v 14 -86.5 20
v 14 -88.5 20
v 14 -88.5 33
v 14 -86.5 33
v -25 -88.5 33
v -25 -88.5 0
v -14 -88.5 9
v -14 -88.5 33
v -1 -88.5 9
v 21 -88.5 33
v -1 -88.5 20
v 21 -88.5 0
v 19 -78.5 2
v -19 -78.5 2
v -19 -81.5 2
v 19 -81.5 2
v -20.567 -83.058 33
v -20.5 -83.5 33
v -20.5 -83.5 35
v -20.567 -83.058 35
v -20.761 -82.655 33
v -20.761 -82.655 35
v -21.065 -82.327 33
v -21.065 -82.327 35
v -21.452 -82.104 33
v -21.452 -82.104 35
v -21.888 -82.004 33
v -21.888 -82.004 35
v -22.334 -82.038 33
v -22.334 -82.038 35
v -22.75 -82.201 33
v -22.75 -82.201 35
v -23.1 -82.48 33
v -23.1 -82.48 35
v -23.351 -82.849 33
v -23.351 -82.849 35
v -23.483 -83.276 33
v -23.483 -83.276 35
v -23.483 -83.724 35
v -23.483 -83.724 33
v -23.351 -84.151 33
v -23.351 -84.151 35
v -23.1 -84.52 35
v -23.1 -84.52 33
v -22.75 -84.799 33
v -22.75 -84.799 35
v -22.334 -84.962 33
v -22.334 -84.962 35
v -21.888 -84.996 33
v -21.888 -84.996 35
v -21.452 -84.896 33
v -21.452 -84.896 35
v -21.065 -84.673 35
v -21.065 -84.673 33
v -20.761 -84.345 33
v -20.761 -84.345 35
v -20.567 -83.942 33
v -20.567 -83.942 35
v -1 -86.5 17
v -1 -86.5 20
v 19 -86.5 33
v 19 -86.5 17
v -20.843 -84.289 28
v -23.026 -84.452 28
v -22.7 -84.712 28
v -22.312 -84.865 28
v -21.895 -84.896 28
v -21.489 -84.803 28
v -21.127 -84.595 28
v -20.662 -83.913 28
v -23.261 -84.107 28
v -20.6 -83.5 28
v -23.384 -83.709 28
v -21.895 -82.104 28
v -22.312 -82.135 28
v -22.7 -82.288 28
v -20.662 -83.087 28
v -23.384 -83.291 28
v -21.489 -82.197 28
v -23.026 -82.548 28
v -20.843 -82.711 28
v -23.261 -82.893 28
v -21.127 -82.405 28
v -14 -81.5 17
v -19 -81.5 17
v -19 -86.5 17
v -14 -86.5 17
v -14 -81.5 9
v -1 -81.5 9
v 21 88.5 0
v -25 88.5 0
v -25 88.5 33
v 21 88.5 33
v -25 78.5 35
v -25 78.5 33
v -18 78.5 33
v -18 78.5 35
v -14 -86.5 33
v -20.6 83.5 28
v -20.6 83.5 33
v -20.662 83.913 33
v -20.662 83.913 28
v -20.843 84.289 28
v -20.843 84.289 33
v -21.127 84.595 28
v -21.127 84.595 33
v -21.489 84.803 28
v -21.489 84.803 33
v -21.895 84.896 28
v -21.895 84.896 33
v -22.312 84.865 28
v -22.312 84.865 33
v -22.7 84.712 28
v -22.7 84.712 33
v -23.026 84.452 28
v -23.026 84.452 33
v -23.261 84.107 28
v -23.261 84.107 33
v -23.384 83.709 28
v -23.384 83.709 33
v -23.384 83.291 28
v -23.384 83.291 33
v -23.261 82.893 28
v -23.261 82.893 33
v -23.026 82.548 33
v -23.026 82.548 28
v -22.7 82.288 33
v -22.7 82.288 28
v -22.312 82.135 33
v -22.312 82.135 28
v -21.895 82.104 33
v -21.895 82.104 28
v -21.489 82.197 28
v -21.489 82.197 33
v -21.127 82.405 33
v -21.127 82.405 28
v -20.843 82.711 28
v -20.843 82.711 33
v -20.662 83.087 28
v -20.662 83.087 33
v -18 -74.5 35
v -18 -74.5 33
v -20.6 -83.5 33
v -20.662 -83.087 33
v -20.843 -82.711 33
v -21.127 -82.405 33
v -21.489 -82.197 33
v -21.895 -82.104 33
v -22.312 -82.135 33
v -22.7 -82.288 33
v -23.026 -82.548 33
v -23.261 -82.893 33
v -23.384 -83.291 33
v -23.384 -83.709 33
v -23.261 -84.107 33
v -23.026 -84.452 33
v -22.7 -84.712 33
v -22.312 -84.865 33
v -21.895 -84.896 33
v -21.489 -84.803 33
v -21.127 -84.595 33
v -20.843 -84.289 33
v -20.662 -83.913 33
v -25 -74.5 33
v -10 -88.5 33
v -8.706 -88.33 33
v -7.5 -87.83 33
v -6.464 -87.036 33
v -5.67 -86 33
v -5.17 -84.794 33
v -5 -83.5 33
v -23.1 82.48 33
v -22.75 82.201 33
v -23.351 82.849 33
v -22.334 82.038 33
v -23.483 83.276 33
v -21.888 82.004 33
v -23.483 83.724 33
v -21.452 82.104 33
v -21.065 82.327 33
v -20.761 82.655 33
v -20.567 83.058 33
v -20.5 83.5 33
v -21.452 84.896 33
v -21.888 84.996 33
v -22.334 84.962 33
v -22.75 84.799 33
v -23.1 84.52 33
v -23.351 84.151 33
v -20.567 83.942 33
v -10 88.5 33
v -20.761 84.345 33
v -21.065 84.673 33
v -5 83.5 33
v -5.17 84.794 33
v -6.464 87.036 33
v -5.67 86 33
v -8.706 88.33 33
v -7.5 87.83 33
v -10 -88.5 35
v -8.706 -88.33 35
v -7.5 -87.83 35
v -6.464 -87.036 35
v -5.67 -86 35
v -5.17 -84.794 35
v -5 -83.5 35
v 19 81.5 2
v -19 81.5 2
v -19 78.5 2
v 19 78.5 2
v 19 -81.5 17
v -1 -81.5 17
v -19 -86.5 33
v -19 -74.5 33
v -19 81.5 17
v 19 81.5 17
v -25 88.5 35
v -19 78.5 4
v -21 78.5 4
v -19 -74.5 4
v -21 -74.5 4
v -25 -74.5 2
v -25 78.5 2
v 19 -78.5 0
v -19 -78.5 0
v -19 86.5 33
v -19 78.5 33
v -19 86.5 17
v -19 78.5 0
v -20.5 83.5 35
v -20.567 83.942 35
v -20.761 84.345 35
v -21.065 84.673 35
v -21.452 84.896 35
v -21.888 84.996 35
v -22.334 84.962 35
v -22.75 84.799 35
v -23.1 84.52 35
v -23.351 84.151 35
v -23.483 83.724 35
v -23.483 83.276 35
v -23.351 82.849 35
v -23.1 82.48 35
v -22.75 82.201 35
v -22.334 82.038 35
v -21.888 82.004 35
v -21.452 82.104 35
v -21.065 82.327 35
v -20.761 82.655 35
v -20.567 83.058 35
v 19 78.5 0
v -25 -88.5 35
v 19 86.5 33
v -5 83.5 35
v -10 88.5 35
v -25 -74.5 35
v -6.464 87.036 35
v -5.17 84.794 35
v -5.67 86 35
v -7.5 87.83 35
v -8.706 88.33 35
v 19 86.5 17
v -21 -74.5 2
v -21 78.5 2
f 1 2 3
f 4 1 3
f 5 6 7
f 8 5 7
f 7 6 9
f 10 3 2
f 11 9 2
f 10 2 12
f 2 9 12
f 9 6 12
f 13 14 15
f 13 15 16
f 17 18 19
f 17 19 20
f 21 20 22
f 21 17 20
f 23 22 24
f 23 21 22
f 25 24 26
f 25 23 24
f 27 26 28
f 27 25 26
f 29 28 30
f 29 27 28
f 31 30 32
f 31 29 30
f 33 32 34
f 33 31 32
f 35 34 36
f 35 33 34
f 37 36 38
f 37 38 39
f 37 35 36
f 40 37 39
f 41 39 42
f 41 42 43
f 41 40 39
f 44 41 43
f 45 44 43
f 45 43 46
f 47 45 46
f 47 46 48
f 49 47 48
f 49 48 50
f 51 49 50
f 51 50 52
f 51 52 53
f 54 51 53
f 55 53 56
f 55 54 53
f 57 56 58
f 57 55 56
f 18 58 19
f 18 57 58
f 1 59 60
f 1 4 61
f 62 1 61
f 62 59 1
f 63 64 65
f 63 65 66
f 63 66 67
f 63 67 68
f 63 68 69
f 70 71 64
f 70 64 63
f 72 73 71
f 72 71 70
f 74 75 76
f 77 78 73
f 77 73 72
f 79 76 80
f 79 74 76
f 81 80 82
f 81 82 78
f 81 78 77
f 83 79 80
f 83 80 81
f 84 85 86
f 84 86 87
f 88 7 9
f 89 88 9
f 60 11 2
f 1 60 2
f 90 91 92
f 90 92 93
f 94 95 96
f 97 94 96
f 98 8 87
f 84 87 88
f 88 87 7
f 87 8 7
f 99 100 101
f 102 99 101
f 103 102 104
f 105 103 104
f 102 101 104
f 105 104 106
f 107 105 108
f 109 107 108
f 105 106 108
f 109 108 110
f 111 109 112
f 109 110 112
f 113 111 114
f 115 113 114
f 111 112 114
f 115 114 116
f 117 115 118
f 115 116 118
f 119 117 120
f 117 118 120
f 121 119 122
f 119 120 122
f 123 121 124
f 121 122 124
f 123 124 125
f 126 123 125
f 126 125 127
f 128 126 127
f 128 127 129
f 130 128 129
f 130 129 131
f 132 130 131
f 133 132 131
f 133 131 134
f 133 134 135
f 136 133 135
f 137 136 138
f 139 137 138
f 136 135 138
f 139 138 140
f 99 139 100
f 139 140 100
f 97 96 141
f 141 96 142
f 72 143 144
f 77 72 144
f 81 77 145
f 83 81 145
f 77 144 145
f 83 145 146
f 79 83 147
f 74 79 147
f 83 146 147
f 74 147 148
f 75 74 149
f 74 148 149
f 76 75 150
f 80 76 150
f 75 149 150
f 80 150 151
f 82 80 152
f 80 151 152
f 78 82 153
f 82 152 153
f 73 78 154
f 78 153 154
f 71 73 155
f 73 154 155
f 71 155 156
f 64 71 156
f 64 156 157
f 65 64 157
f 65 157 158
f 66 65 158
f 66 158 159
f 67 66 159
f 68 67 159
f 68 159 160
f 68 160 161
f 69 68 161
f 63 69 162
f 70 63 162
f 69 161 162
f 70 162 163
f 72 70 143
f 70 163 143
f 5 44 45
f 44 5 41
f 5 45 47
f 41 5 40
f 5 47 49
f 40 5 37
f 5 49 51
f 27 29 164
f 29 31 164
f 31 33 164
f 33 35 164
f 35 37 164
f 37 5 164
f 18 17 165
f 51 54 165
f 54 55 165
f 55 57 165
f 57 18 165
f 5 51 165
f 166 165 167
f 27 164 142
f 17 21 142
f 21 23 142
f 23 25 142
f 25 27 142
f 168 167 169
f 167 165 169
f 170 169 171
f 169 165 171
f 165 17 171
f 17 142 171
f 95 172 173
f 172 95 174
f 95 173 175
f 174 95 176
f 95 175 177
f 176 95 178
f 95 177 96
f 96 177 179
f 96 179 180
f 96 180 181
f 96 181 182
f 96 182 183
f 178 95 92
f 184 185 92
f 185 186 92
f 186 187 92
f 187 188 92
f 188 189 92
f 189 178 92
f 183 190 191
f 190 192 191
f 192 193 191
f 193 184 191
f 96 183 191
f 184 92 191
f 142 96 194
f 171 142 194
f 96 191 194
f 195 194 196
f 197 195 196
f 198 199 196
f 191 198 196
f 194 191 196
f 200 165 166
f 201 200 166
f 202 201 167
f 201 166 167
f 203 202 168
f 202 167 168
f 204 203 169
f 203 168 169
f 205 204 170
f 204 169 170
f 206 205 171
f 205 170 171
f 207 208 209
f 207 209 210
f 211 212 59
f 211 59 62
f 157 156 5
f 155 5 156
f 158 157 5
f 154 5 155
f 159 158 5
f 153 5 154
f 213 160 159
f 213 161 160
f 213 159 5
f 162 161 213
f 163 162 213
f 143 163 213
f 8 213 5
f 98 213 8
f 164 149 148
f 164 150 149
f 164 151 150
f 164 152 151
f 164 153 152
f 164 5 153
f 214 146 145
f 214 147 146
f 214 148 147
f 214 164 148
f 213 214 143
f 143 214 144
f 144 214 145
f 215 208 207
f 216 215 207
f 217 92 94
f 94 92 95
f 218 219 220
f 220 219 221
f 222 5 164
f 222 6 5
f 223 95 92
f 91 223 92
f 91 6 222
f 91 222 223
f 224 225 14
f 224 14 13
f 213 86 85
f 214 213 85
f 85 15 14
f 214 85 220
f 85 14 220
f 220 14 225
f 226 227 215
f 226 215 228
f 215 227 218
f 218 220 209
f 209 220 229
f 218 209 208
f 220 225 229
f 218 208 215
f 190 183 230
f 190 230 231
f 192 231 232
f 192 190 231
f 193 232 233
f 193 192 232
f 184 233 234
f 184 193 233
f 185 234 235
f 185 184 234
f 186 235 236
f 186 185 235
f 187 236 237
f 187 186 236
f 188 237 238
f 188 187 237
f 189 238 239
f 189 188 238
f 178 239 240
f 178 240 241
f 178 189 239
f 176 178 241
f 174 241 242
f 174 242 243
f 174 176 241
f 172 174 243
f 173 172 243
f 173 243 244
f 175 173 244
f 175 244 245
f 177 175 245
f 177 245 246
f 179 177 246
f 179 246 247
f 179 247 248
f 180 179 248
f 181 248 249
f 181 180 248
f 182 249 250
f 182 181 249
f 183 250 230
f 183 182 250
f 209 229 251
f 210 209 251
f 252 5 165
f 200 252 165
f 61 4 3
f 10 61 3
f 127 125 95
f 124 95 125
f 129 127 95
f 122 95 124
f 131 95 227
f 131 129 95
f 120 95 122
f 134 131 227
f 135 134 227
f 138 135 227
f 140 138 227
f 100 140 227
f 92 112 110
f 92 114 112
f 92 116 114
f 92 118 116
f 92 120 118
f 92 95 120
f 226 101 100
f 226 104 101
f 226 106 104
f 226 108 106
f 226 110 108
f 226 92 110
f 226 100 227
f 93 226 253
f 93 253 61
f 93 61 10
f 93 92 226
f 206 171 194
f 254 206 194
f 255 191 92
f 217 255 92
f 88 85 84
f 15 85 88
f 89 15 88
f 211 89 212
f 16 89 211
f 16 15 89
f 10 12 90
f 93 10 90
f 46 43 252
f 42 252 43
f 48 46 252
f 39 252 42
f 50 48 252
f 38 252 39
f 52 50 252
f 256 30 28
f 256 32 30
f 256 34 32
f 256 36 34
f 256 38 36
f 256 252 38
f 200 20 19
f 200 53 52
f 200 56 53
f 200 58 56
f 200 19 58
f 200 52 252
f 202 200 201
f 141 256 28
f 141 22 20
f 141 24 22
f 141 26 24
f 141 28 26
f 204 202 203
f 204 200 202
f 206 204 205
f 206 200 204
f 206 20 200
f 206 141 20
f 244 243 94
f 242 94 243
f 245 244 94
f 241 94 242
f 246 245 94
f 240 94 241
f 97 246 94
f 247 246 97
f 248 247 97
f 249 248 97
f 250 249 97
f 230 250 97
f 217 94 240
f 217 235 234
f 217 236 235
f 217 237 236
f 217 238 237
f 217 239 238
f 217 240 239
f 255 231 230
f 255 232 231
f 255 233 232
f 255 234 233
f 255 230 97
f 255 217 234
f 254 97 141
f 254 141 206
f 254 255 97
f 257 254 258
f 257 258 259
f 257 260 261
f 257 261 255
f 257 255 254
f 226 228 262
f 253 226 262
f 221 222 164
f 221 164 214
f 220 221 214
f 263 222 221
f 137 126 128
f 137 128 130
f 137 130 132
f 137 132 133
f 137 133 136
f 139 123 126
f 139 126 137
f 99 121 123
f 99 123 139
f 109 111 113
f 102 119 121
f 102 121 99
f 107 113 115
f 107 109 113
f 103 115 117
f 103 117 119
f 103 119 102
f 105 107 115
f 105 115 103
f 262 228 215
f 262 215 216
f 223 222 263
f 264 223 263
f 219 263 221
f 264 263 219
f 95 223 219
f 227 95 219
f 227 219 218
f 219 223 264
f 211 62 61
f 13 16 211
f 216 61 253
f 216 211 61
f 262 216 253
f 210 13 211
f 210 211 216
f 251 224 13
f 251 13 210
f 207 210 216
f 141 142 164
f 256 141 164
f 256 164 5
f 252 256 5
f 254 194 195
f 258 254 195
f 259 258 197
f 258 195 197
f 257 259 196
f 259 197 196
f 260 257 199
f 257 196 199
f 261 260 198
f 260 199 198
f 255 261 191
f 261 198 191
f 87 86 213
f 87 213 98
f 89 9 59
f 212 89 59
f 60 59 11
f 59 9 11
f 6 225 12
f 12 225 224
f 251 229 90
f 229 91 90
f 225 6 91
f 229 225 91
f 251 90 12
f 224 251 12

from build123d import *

# Parameters (mm, degrees)
F0_W      = 42
F0_H      = 177
F0_W_2    = 38
F0_H_2    = 173
F1_DEPTH  = 33
F2_W      = 153
F2_H      = 29
F3_DEPTH  = 5.8
F4_W      = 38
F4_H      = 5
F5_DEPTH  = 17
F6_W      = 4
F6_H      = 177
F6_W_2    = 38
F6_H_2    = 3
F7_DEPTH  = 2
F8_W      = 4
F8_H      = 14
F8_H_2    = 10
F9_DEPTH  = 31
F10_R     = 1.4
F11_DEPTH = 5
F12_W     = 13
F12_H     = 11
F13_DEPTH = 7
F15_R     = 1.5
F15_W     = 13
F15_H     = 15
F15_H_2   = 123
F16_DEPTH = 2


with BuildPart() as f1:
    # F0 (on Top) → F1 (new body)
    with BuildSketch(Plane.XY):
        Rectangle(F0_W, F0_H)
        Rectangle(F0_W_2, F0_H_2, mode=Mode.SUBTRACT)
    extrude(amount=F1_DEPTH)

    # F2 (on face) → F3 (cut)
    with BuildSketch(Plane(origin=(-21, 0, 0), x_dir=(0, -1, 0), z_dir=(-1, 0, 0))):
        with Locations((-2, 18.5)):
            Rectangle(F2_W, F2_H)
    extrude(amount=-F3_DEPTH, mode=Mode.SUBTRACT)

    # F4 (on Top) → F5 (join)
    with BuildSketch(Plane.XY):
        with Locations((0, 84)):
            Rectangle(F4_W, F4_H)
        with Locations((0, -84)):
            Rectangle(F4_W, F4_H)
    extrude(amount=F5_DEPTH)

    # F6 (on Top) → F7 (join)
    with BuildSketch(Plane.XY):
        with Locations((-23, 0)):
            Rectangle(F6_W, F6_H)
        with Locations((0, 80)):
            Rectangle(F6_W_2, F6_H_2)
        with Locations((0, -80)):
            Rectangle(F6_W_2, F6_H_2)
    extrude(amount=F7_DEPTH)

    # F8 (on face) → F9 (join)
    with BuildSketch(Plane.XY.offset(2)):
        with Locations((-23, -81.5)):
            Rectangle(F8_W, F8_H)
        with Locations((-23, 83.5)):
            Rectangle(F8_W, F8_H_2)
    extrude(amount=F9_DEPTH)

    # F10 (on face) → F11 (cut)
    with BuildSketch(Plane.XY.offset(33)):
        with Locations((-22, -83.5)):
            Circle(F10_R)
        with Locations((-22, 83.5)):
            Circle(F10_R)
    extrude(amount=-F11_DEPTH, mode=Mode.SUBTRACT)

    # F12 (on face) → F13 (cut)
    with BuildSketch(Plane.XZ.offset(88.5)):
        Polygon((14, 20), (14, 33), (-14, 33), (-14, 20), (-1, 20), align=None)
        with Locations((-7.5, 14.5)):
            Rectangle(F12_W, F12_H)
    extrude(amount=-F13_DEPTH, mode=Mode.SUBTRACT)


with BuildPart() as f16:
    # F15 (on offset) → F16 (new body)
    with BuildSketch(Plane.XY.offset(33)):
        with BuildLine():
            Line((-10, 88.5), (-25, 88.5))
            Line((-25, 88.5), (-25, 78.5))
            Line((-25, 78.5), (-18, 78.5))
            Line((-18, 78.5), (-5, 78.5))
            Line((-5, 78.5), (-5, 83.5))
            ThreePointArc((-5, 83.5), (-6.464466, 87.035534), (-10, 88.5))
        make_face()
        with Locations((-22, 83.5)):
            Circle(F15_R, mode=Mode.SUBTRACT)
        with Locations((-11.5, 71)):
            Rectangle(F15_W, F15_H)
        with Locations((-11.5, 2)):
            Rectangle(F15_W, F15_H_2)
        with Locations((-11.5, -67)):
            Rectangle(F15_W, F15_H)
        with BuildLine():
            Line((-5, -74.5), (-18, -74.5))
            Line((-18, -74.5), (-25, -74.5))
            Line((-25, -74.5), (-25, -88.5))
            Line((-25, -88.5), (-10, -88.5))
            ThreePointArc((-10, -88.5), (-6.464466, -87.035534), (-5, -83.5))
            Line((-5, -83.5), (-5, -74.5))
        make_face()
        with Locations((-22, -83.5)):
            Circle(F15_R, mode=Mode.SUBTRACT)
    extrude(amount=F16_DEPTH)


solid = Compound([f1.part, f16.part])
